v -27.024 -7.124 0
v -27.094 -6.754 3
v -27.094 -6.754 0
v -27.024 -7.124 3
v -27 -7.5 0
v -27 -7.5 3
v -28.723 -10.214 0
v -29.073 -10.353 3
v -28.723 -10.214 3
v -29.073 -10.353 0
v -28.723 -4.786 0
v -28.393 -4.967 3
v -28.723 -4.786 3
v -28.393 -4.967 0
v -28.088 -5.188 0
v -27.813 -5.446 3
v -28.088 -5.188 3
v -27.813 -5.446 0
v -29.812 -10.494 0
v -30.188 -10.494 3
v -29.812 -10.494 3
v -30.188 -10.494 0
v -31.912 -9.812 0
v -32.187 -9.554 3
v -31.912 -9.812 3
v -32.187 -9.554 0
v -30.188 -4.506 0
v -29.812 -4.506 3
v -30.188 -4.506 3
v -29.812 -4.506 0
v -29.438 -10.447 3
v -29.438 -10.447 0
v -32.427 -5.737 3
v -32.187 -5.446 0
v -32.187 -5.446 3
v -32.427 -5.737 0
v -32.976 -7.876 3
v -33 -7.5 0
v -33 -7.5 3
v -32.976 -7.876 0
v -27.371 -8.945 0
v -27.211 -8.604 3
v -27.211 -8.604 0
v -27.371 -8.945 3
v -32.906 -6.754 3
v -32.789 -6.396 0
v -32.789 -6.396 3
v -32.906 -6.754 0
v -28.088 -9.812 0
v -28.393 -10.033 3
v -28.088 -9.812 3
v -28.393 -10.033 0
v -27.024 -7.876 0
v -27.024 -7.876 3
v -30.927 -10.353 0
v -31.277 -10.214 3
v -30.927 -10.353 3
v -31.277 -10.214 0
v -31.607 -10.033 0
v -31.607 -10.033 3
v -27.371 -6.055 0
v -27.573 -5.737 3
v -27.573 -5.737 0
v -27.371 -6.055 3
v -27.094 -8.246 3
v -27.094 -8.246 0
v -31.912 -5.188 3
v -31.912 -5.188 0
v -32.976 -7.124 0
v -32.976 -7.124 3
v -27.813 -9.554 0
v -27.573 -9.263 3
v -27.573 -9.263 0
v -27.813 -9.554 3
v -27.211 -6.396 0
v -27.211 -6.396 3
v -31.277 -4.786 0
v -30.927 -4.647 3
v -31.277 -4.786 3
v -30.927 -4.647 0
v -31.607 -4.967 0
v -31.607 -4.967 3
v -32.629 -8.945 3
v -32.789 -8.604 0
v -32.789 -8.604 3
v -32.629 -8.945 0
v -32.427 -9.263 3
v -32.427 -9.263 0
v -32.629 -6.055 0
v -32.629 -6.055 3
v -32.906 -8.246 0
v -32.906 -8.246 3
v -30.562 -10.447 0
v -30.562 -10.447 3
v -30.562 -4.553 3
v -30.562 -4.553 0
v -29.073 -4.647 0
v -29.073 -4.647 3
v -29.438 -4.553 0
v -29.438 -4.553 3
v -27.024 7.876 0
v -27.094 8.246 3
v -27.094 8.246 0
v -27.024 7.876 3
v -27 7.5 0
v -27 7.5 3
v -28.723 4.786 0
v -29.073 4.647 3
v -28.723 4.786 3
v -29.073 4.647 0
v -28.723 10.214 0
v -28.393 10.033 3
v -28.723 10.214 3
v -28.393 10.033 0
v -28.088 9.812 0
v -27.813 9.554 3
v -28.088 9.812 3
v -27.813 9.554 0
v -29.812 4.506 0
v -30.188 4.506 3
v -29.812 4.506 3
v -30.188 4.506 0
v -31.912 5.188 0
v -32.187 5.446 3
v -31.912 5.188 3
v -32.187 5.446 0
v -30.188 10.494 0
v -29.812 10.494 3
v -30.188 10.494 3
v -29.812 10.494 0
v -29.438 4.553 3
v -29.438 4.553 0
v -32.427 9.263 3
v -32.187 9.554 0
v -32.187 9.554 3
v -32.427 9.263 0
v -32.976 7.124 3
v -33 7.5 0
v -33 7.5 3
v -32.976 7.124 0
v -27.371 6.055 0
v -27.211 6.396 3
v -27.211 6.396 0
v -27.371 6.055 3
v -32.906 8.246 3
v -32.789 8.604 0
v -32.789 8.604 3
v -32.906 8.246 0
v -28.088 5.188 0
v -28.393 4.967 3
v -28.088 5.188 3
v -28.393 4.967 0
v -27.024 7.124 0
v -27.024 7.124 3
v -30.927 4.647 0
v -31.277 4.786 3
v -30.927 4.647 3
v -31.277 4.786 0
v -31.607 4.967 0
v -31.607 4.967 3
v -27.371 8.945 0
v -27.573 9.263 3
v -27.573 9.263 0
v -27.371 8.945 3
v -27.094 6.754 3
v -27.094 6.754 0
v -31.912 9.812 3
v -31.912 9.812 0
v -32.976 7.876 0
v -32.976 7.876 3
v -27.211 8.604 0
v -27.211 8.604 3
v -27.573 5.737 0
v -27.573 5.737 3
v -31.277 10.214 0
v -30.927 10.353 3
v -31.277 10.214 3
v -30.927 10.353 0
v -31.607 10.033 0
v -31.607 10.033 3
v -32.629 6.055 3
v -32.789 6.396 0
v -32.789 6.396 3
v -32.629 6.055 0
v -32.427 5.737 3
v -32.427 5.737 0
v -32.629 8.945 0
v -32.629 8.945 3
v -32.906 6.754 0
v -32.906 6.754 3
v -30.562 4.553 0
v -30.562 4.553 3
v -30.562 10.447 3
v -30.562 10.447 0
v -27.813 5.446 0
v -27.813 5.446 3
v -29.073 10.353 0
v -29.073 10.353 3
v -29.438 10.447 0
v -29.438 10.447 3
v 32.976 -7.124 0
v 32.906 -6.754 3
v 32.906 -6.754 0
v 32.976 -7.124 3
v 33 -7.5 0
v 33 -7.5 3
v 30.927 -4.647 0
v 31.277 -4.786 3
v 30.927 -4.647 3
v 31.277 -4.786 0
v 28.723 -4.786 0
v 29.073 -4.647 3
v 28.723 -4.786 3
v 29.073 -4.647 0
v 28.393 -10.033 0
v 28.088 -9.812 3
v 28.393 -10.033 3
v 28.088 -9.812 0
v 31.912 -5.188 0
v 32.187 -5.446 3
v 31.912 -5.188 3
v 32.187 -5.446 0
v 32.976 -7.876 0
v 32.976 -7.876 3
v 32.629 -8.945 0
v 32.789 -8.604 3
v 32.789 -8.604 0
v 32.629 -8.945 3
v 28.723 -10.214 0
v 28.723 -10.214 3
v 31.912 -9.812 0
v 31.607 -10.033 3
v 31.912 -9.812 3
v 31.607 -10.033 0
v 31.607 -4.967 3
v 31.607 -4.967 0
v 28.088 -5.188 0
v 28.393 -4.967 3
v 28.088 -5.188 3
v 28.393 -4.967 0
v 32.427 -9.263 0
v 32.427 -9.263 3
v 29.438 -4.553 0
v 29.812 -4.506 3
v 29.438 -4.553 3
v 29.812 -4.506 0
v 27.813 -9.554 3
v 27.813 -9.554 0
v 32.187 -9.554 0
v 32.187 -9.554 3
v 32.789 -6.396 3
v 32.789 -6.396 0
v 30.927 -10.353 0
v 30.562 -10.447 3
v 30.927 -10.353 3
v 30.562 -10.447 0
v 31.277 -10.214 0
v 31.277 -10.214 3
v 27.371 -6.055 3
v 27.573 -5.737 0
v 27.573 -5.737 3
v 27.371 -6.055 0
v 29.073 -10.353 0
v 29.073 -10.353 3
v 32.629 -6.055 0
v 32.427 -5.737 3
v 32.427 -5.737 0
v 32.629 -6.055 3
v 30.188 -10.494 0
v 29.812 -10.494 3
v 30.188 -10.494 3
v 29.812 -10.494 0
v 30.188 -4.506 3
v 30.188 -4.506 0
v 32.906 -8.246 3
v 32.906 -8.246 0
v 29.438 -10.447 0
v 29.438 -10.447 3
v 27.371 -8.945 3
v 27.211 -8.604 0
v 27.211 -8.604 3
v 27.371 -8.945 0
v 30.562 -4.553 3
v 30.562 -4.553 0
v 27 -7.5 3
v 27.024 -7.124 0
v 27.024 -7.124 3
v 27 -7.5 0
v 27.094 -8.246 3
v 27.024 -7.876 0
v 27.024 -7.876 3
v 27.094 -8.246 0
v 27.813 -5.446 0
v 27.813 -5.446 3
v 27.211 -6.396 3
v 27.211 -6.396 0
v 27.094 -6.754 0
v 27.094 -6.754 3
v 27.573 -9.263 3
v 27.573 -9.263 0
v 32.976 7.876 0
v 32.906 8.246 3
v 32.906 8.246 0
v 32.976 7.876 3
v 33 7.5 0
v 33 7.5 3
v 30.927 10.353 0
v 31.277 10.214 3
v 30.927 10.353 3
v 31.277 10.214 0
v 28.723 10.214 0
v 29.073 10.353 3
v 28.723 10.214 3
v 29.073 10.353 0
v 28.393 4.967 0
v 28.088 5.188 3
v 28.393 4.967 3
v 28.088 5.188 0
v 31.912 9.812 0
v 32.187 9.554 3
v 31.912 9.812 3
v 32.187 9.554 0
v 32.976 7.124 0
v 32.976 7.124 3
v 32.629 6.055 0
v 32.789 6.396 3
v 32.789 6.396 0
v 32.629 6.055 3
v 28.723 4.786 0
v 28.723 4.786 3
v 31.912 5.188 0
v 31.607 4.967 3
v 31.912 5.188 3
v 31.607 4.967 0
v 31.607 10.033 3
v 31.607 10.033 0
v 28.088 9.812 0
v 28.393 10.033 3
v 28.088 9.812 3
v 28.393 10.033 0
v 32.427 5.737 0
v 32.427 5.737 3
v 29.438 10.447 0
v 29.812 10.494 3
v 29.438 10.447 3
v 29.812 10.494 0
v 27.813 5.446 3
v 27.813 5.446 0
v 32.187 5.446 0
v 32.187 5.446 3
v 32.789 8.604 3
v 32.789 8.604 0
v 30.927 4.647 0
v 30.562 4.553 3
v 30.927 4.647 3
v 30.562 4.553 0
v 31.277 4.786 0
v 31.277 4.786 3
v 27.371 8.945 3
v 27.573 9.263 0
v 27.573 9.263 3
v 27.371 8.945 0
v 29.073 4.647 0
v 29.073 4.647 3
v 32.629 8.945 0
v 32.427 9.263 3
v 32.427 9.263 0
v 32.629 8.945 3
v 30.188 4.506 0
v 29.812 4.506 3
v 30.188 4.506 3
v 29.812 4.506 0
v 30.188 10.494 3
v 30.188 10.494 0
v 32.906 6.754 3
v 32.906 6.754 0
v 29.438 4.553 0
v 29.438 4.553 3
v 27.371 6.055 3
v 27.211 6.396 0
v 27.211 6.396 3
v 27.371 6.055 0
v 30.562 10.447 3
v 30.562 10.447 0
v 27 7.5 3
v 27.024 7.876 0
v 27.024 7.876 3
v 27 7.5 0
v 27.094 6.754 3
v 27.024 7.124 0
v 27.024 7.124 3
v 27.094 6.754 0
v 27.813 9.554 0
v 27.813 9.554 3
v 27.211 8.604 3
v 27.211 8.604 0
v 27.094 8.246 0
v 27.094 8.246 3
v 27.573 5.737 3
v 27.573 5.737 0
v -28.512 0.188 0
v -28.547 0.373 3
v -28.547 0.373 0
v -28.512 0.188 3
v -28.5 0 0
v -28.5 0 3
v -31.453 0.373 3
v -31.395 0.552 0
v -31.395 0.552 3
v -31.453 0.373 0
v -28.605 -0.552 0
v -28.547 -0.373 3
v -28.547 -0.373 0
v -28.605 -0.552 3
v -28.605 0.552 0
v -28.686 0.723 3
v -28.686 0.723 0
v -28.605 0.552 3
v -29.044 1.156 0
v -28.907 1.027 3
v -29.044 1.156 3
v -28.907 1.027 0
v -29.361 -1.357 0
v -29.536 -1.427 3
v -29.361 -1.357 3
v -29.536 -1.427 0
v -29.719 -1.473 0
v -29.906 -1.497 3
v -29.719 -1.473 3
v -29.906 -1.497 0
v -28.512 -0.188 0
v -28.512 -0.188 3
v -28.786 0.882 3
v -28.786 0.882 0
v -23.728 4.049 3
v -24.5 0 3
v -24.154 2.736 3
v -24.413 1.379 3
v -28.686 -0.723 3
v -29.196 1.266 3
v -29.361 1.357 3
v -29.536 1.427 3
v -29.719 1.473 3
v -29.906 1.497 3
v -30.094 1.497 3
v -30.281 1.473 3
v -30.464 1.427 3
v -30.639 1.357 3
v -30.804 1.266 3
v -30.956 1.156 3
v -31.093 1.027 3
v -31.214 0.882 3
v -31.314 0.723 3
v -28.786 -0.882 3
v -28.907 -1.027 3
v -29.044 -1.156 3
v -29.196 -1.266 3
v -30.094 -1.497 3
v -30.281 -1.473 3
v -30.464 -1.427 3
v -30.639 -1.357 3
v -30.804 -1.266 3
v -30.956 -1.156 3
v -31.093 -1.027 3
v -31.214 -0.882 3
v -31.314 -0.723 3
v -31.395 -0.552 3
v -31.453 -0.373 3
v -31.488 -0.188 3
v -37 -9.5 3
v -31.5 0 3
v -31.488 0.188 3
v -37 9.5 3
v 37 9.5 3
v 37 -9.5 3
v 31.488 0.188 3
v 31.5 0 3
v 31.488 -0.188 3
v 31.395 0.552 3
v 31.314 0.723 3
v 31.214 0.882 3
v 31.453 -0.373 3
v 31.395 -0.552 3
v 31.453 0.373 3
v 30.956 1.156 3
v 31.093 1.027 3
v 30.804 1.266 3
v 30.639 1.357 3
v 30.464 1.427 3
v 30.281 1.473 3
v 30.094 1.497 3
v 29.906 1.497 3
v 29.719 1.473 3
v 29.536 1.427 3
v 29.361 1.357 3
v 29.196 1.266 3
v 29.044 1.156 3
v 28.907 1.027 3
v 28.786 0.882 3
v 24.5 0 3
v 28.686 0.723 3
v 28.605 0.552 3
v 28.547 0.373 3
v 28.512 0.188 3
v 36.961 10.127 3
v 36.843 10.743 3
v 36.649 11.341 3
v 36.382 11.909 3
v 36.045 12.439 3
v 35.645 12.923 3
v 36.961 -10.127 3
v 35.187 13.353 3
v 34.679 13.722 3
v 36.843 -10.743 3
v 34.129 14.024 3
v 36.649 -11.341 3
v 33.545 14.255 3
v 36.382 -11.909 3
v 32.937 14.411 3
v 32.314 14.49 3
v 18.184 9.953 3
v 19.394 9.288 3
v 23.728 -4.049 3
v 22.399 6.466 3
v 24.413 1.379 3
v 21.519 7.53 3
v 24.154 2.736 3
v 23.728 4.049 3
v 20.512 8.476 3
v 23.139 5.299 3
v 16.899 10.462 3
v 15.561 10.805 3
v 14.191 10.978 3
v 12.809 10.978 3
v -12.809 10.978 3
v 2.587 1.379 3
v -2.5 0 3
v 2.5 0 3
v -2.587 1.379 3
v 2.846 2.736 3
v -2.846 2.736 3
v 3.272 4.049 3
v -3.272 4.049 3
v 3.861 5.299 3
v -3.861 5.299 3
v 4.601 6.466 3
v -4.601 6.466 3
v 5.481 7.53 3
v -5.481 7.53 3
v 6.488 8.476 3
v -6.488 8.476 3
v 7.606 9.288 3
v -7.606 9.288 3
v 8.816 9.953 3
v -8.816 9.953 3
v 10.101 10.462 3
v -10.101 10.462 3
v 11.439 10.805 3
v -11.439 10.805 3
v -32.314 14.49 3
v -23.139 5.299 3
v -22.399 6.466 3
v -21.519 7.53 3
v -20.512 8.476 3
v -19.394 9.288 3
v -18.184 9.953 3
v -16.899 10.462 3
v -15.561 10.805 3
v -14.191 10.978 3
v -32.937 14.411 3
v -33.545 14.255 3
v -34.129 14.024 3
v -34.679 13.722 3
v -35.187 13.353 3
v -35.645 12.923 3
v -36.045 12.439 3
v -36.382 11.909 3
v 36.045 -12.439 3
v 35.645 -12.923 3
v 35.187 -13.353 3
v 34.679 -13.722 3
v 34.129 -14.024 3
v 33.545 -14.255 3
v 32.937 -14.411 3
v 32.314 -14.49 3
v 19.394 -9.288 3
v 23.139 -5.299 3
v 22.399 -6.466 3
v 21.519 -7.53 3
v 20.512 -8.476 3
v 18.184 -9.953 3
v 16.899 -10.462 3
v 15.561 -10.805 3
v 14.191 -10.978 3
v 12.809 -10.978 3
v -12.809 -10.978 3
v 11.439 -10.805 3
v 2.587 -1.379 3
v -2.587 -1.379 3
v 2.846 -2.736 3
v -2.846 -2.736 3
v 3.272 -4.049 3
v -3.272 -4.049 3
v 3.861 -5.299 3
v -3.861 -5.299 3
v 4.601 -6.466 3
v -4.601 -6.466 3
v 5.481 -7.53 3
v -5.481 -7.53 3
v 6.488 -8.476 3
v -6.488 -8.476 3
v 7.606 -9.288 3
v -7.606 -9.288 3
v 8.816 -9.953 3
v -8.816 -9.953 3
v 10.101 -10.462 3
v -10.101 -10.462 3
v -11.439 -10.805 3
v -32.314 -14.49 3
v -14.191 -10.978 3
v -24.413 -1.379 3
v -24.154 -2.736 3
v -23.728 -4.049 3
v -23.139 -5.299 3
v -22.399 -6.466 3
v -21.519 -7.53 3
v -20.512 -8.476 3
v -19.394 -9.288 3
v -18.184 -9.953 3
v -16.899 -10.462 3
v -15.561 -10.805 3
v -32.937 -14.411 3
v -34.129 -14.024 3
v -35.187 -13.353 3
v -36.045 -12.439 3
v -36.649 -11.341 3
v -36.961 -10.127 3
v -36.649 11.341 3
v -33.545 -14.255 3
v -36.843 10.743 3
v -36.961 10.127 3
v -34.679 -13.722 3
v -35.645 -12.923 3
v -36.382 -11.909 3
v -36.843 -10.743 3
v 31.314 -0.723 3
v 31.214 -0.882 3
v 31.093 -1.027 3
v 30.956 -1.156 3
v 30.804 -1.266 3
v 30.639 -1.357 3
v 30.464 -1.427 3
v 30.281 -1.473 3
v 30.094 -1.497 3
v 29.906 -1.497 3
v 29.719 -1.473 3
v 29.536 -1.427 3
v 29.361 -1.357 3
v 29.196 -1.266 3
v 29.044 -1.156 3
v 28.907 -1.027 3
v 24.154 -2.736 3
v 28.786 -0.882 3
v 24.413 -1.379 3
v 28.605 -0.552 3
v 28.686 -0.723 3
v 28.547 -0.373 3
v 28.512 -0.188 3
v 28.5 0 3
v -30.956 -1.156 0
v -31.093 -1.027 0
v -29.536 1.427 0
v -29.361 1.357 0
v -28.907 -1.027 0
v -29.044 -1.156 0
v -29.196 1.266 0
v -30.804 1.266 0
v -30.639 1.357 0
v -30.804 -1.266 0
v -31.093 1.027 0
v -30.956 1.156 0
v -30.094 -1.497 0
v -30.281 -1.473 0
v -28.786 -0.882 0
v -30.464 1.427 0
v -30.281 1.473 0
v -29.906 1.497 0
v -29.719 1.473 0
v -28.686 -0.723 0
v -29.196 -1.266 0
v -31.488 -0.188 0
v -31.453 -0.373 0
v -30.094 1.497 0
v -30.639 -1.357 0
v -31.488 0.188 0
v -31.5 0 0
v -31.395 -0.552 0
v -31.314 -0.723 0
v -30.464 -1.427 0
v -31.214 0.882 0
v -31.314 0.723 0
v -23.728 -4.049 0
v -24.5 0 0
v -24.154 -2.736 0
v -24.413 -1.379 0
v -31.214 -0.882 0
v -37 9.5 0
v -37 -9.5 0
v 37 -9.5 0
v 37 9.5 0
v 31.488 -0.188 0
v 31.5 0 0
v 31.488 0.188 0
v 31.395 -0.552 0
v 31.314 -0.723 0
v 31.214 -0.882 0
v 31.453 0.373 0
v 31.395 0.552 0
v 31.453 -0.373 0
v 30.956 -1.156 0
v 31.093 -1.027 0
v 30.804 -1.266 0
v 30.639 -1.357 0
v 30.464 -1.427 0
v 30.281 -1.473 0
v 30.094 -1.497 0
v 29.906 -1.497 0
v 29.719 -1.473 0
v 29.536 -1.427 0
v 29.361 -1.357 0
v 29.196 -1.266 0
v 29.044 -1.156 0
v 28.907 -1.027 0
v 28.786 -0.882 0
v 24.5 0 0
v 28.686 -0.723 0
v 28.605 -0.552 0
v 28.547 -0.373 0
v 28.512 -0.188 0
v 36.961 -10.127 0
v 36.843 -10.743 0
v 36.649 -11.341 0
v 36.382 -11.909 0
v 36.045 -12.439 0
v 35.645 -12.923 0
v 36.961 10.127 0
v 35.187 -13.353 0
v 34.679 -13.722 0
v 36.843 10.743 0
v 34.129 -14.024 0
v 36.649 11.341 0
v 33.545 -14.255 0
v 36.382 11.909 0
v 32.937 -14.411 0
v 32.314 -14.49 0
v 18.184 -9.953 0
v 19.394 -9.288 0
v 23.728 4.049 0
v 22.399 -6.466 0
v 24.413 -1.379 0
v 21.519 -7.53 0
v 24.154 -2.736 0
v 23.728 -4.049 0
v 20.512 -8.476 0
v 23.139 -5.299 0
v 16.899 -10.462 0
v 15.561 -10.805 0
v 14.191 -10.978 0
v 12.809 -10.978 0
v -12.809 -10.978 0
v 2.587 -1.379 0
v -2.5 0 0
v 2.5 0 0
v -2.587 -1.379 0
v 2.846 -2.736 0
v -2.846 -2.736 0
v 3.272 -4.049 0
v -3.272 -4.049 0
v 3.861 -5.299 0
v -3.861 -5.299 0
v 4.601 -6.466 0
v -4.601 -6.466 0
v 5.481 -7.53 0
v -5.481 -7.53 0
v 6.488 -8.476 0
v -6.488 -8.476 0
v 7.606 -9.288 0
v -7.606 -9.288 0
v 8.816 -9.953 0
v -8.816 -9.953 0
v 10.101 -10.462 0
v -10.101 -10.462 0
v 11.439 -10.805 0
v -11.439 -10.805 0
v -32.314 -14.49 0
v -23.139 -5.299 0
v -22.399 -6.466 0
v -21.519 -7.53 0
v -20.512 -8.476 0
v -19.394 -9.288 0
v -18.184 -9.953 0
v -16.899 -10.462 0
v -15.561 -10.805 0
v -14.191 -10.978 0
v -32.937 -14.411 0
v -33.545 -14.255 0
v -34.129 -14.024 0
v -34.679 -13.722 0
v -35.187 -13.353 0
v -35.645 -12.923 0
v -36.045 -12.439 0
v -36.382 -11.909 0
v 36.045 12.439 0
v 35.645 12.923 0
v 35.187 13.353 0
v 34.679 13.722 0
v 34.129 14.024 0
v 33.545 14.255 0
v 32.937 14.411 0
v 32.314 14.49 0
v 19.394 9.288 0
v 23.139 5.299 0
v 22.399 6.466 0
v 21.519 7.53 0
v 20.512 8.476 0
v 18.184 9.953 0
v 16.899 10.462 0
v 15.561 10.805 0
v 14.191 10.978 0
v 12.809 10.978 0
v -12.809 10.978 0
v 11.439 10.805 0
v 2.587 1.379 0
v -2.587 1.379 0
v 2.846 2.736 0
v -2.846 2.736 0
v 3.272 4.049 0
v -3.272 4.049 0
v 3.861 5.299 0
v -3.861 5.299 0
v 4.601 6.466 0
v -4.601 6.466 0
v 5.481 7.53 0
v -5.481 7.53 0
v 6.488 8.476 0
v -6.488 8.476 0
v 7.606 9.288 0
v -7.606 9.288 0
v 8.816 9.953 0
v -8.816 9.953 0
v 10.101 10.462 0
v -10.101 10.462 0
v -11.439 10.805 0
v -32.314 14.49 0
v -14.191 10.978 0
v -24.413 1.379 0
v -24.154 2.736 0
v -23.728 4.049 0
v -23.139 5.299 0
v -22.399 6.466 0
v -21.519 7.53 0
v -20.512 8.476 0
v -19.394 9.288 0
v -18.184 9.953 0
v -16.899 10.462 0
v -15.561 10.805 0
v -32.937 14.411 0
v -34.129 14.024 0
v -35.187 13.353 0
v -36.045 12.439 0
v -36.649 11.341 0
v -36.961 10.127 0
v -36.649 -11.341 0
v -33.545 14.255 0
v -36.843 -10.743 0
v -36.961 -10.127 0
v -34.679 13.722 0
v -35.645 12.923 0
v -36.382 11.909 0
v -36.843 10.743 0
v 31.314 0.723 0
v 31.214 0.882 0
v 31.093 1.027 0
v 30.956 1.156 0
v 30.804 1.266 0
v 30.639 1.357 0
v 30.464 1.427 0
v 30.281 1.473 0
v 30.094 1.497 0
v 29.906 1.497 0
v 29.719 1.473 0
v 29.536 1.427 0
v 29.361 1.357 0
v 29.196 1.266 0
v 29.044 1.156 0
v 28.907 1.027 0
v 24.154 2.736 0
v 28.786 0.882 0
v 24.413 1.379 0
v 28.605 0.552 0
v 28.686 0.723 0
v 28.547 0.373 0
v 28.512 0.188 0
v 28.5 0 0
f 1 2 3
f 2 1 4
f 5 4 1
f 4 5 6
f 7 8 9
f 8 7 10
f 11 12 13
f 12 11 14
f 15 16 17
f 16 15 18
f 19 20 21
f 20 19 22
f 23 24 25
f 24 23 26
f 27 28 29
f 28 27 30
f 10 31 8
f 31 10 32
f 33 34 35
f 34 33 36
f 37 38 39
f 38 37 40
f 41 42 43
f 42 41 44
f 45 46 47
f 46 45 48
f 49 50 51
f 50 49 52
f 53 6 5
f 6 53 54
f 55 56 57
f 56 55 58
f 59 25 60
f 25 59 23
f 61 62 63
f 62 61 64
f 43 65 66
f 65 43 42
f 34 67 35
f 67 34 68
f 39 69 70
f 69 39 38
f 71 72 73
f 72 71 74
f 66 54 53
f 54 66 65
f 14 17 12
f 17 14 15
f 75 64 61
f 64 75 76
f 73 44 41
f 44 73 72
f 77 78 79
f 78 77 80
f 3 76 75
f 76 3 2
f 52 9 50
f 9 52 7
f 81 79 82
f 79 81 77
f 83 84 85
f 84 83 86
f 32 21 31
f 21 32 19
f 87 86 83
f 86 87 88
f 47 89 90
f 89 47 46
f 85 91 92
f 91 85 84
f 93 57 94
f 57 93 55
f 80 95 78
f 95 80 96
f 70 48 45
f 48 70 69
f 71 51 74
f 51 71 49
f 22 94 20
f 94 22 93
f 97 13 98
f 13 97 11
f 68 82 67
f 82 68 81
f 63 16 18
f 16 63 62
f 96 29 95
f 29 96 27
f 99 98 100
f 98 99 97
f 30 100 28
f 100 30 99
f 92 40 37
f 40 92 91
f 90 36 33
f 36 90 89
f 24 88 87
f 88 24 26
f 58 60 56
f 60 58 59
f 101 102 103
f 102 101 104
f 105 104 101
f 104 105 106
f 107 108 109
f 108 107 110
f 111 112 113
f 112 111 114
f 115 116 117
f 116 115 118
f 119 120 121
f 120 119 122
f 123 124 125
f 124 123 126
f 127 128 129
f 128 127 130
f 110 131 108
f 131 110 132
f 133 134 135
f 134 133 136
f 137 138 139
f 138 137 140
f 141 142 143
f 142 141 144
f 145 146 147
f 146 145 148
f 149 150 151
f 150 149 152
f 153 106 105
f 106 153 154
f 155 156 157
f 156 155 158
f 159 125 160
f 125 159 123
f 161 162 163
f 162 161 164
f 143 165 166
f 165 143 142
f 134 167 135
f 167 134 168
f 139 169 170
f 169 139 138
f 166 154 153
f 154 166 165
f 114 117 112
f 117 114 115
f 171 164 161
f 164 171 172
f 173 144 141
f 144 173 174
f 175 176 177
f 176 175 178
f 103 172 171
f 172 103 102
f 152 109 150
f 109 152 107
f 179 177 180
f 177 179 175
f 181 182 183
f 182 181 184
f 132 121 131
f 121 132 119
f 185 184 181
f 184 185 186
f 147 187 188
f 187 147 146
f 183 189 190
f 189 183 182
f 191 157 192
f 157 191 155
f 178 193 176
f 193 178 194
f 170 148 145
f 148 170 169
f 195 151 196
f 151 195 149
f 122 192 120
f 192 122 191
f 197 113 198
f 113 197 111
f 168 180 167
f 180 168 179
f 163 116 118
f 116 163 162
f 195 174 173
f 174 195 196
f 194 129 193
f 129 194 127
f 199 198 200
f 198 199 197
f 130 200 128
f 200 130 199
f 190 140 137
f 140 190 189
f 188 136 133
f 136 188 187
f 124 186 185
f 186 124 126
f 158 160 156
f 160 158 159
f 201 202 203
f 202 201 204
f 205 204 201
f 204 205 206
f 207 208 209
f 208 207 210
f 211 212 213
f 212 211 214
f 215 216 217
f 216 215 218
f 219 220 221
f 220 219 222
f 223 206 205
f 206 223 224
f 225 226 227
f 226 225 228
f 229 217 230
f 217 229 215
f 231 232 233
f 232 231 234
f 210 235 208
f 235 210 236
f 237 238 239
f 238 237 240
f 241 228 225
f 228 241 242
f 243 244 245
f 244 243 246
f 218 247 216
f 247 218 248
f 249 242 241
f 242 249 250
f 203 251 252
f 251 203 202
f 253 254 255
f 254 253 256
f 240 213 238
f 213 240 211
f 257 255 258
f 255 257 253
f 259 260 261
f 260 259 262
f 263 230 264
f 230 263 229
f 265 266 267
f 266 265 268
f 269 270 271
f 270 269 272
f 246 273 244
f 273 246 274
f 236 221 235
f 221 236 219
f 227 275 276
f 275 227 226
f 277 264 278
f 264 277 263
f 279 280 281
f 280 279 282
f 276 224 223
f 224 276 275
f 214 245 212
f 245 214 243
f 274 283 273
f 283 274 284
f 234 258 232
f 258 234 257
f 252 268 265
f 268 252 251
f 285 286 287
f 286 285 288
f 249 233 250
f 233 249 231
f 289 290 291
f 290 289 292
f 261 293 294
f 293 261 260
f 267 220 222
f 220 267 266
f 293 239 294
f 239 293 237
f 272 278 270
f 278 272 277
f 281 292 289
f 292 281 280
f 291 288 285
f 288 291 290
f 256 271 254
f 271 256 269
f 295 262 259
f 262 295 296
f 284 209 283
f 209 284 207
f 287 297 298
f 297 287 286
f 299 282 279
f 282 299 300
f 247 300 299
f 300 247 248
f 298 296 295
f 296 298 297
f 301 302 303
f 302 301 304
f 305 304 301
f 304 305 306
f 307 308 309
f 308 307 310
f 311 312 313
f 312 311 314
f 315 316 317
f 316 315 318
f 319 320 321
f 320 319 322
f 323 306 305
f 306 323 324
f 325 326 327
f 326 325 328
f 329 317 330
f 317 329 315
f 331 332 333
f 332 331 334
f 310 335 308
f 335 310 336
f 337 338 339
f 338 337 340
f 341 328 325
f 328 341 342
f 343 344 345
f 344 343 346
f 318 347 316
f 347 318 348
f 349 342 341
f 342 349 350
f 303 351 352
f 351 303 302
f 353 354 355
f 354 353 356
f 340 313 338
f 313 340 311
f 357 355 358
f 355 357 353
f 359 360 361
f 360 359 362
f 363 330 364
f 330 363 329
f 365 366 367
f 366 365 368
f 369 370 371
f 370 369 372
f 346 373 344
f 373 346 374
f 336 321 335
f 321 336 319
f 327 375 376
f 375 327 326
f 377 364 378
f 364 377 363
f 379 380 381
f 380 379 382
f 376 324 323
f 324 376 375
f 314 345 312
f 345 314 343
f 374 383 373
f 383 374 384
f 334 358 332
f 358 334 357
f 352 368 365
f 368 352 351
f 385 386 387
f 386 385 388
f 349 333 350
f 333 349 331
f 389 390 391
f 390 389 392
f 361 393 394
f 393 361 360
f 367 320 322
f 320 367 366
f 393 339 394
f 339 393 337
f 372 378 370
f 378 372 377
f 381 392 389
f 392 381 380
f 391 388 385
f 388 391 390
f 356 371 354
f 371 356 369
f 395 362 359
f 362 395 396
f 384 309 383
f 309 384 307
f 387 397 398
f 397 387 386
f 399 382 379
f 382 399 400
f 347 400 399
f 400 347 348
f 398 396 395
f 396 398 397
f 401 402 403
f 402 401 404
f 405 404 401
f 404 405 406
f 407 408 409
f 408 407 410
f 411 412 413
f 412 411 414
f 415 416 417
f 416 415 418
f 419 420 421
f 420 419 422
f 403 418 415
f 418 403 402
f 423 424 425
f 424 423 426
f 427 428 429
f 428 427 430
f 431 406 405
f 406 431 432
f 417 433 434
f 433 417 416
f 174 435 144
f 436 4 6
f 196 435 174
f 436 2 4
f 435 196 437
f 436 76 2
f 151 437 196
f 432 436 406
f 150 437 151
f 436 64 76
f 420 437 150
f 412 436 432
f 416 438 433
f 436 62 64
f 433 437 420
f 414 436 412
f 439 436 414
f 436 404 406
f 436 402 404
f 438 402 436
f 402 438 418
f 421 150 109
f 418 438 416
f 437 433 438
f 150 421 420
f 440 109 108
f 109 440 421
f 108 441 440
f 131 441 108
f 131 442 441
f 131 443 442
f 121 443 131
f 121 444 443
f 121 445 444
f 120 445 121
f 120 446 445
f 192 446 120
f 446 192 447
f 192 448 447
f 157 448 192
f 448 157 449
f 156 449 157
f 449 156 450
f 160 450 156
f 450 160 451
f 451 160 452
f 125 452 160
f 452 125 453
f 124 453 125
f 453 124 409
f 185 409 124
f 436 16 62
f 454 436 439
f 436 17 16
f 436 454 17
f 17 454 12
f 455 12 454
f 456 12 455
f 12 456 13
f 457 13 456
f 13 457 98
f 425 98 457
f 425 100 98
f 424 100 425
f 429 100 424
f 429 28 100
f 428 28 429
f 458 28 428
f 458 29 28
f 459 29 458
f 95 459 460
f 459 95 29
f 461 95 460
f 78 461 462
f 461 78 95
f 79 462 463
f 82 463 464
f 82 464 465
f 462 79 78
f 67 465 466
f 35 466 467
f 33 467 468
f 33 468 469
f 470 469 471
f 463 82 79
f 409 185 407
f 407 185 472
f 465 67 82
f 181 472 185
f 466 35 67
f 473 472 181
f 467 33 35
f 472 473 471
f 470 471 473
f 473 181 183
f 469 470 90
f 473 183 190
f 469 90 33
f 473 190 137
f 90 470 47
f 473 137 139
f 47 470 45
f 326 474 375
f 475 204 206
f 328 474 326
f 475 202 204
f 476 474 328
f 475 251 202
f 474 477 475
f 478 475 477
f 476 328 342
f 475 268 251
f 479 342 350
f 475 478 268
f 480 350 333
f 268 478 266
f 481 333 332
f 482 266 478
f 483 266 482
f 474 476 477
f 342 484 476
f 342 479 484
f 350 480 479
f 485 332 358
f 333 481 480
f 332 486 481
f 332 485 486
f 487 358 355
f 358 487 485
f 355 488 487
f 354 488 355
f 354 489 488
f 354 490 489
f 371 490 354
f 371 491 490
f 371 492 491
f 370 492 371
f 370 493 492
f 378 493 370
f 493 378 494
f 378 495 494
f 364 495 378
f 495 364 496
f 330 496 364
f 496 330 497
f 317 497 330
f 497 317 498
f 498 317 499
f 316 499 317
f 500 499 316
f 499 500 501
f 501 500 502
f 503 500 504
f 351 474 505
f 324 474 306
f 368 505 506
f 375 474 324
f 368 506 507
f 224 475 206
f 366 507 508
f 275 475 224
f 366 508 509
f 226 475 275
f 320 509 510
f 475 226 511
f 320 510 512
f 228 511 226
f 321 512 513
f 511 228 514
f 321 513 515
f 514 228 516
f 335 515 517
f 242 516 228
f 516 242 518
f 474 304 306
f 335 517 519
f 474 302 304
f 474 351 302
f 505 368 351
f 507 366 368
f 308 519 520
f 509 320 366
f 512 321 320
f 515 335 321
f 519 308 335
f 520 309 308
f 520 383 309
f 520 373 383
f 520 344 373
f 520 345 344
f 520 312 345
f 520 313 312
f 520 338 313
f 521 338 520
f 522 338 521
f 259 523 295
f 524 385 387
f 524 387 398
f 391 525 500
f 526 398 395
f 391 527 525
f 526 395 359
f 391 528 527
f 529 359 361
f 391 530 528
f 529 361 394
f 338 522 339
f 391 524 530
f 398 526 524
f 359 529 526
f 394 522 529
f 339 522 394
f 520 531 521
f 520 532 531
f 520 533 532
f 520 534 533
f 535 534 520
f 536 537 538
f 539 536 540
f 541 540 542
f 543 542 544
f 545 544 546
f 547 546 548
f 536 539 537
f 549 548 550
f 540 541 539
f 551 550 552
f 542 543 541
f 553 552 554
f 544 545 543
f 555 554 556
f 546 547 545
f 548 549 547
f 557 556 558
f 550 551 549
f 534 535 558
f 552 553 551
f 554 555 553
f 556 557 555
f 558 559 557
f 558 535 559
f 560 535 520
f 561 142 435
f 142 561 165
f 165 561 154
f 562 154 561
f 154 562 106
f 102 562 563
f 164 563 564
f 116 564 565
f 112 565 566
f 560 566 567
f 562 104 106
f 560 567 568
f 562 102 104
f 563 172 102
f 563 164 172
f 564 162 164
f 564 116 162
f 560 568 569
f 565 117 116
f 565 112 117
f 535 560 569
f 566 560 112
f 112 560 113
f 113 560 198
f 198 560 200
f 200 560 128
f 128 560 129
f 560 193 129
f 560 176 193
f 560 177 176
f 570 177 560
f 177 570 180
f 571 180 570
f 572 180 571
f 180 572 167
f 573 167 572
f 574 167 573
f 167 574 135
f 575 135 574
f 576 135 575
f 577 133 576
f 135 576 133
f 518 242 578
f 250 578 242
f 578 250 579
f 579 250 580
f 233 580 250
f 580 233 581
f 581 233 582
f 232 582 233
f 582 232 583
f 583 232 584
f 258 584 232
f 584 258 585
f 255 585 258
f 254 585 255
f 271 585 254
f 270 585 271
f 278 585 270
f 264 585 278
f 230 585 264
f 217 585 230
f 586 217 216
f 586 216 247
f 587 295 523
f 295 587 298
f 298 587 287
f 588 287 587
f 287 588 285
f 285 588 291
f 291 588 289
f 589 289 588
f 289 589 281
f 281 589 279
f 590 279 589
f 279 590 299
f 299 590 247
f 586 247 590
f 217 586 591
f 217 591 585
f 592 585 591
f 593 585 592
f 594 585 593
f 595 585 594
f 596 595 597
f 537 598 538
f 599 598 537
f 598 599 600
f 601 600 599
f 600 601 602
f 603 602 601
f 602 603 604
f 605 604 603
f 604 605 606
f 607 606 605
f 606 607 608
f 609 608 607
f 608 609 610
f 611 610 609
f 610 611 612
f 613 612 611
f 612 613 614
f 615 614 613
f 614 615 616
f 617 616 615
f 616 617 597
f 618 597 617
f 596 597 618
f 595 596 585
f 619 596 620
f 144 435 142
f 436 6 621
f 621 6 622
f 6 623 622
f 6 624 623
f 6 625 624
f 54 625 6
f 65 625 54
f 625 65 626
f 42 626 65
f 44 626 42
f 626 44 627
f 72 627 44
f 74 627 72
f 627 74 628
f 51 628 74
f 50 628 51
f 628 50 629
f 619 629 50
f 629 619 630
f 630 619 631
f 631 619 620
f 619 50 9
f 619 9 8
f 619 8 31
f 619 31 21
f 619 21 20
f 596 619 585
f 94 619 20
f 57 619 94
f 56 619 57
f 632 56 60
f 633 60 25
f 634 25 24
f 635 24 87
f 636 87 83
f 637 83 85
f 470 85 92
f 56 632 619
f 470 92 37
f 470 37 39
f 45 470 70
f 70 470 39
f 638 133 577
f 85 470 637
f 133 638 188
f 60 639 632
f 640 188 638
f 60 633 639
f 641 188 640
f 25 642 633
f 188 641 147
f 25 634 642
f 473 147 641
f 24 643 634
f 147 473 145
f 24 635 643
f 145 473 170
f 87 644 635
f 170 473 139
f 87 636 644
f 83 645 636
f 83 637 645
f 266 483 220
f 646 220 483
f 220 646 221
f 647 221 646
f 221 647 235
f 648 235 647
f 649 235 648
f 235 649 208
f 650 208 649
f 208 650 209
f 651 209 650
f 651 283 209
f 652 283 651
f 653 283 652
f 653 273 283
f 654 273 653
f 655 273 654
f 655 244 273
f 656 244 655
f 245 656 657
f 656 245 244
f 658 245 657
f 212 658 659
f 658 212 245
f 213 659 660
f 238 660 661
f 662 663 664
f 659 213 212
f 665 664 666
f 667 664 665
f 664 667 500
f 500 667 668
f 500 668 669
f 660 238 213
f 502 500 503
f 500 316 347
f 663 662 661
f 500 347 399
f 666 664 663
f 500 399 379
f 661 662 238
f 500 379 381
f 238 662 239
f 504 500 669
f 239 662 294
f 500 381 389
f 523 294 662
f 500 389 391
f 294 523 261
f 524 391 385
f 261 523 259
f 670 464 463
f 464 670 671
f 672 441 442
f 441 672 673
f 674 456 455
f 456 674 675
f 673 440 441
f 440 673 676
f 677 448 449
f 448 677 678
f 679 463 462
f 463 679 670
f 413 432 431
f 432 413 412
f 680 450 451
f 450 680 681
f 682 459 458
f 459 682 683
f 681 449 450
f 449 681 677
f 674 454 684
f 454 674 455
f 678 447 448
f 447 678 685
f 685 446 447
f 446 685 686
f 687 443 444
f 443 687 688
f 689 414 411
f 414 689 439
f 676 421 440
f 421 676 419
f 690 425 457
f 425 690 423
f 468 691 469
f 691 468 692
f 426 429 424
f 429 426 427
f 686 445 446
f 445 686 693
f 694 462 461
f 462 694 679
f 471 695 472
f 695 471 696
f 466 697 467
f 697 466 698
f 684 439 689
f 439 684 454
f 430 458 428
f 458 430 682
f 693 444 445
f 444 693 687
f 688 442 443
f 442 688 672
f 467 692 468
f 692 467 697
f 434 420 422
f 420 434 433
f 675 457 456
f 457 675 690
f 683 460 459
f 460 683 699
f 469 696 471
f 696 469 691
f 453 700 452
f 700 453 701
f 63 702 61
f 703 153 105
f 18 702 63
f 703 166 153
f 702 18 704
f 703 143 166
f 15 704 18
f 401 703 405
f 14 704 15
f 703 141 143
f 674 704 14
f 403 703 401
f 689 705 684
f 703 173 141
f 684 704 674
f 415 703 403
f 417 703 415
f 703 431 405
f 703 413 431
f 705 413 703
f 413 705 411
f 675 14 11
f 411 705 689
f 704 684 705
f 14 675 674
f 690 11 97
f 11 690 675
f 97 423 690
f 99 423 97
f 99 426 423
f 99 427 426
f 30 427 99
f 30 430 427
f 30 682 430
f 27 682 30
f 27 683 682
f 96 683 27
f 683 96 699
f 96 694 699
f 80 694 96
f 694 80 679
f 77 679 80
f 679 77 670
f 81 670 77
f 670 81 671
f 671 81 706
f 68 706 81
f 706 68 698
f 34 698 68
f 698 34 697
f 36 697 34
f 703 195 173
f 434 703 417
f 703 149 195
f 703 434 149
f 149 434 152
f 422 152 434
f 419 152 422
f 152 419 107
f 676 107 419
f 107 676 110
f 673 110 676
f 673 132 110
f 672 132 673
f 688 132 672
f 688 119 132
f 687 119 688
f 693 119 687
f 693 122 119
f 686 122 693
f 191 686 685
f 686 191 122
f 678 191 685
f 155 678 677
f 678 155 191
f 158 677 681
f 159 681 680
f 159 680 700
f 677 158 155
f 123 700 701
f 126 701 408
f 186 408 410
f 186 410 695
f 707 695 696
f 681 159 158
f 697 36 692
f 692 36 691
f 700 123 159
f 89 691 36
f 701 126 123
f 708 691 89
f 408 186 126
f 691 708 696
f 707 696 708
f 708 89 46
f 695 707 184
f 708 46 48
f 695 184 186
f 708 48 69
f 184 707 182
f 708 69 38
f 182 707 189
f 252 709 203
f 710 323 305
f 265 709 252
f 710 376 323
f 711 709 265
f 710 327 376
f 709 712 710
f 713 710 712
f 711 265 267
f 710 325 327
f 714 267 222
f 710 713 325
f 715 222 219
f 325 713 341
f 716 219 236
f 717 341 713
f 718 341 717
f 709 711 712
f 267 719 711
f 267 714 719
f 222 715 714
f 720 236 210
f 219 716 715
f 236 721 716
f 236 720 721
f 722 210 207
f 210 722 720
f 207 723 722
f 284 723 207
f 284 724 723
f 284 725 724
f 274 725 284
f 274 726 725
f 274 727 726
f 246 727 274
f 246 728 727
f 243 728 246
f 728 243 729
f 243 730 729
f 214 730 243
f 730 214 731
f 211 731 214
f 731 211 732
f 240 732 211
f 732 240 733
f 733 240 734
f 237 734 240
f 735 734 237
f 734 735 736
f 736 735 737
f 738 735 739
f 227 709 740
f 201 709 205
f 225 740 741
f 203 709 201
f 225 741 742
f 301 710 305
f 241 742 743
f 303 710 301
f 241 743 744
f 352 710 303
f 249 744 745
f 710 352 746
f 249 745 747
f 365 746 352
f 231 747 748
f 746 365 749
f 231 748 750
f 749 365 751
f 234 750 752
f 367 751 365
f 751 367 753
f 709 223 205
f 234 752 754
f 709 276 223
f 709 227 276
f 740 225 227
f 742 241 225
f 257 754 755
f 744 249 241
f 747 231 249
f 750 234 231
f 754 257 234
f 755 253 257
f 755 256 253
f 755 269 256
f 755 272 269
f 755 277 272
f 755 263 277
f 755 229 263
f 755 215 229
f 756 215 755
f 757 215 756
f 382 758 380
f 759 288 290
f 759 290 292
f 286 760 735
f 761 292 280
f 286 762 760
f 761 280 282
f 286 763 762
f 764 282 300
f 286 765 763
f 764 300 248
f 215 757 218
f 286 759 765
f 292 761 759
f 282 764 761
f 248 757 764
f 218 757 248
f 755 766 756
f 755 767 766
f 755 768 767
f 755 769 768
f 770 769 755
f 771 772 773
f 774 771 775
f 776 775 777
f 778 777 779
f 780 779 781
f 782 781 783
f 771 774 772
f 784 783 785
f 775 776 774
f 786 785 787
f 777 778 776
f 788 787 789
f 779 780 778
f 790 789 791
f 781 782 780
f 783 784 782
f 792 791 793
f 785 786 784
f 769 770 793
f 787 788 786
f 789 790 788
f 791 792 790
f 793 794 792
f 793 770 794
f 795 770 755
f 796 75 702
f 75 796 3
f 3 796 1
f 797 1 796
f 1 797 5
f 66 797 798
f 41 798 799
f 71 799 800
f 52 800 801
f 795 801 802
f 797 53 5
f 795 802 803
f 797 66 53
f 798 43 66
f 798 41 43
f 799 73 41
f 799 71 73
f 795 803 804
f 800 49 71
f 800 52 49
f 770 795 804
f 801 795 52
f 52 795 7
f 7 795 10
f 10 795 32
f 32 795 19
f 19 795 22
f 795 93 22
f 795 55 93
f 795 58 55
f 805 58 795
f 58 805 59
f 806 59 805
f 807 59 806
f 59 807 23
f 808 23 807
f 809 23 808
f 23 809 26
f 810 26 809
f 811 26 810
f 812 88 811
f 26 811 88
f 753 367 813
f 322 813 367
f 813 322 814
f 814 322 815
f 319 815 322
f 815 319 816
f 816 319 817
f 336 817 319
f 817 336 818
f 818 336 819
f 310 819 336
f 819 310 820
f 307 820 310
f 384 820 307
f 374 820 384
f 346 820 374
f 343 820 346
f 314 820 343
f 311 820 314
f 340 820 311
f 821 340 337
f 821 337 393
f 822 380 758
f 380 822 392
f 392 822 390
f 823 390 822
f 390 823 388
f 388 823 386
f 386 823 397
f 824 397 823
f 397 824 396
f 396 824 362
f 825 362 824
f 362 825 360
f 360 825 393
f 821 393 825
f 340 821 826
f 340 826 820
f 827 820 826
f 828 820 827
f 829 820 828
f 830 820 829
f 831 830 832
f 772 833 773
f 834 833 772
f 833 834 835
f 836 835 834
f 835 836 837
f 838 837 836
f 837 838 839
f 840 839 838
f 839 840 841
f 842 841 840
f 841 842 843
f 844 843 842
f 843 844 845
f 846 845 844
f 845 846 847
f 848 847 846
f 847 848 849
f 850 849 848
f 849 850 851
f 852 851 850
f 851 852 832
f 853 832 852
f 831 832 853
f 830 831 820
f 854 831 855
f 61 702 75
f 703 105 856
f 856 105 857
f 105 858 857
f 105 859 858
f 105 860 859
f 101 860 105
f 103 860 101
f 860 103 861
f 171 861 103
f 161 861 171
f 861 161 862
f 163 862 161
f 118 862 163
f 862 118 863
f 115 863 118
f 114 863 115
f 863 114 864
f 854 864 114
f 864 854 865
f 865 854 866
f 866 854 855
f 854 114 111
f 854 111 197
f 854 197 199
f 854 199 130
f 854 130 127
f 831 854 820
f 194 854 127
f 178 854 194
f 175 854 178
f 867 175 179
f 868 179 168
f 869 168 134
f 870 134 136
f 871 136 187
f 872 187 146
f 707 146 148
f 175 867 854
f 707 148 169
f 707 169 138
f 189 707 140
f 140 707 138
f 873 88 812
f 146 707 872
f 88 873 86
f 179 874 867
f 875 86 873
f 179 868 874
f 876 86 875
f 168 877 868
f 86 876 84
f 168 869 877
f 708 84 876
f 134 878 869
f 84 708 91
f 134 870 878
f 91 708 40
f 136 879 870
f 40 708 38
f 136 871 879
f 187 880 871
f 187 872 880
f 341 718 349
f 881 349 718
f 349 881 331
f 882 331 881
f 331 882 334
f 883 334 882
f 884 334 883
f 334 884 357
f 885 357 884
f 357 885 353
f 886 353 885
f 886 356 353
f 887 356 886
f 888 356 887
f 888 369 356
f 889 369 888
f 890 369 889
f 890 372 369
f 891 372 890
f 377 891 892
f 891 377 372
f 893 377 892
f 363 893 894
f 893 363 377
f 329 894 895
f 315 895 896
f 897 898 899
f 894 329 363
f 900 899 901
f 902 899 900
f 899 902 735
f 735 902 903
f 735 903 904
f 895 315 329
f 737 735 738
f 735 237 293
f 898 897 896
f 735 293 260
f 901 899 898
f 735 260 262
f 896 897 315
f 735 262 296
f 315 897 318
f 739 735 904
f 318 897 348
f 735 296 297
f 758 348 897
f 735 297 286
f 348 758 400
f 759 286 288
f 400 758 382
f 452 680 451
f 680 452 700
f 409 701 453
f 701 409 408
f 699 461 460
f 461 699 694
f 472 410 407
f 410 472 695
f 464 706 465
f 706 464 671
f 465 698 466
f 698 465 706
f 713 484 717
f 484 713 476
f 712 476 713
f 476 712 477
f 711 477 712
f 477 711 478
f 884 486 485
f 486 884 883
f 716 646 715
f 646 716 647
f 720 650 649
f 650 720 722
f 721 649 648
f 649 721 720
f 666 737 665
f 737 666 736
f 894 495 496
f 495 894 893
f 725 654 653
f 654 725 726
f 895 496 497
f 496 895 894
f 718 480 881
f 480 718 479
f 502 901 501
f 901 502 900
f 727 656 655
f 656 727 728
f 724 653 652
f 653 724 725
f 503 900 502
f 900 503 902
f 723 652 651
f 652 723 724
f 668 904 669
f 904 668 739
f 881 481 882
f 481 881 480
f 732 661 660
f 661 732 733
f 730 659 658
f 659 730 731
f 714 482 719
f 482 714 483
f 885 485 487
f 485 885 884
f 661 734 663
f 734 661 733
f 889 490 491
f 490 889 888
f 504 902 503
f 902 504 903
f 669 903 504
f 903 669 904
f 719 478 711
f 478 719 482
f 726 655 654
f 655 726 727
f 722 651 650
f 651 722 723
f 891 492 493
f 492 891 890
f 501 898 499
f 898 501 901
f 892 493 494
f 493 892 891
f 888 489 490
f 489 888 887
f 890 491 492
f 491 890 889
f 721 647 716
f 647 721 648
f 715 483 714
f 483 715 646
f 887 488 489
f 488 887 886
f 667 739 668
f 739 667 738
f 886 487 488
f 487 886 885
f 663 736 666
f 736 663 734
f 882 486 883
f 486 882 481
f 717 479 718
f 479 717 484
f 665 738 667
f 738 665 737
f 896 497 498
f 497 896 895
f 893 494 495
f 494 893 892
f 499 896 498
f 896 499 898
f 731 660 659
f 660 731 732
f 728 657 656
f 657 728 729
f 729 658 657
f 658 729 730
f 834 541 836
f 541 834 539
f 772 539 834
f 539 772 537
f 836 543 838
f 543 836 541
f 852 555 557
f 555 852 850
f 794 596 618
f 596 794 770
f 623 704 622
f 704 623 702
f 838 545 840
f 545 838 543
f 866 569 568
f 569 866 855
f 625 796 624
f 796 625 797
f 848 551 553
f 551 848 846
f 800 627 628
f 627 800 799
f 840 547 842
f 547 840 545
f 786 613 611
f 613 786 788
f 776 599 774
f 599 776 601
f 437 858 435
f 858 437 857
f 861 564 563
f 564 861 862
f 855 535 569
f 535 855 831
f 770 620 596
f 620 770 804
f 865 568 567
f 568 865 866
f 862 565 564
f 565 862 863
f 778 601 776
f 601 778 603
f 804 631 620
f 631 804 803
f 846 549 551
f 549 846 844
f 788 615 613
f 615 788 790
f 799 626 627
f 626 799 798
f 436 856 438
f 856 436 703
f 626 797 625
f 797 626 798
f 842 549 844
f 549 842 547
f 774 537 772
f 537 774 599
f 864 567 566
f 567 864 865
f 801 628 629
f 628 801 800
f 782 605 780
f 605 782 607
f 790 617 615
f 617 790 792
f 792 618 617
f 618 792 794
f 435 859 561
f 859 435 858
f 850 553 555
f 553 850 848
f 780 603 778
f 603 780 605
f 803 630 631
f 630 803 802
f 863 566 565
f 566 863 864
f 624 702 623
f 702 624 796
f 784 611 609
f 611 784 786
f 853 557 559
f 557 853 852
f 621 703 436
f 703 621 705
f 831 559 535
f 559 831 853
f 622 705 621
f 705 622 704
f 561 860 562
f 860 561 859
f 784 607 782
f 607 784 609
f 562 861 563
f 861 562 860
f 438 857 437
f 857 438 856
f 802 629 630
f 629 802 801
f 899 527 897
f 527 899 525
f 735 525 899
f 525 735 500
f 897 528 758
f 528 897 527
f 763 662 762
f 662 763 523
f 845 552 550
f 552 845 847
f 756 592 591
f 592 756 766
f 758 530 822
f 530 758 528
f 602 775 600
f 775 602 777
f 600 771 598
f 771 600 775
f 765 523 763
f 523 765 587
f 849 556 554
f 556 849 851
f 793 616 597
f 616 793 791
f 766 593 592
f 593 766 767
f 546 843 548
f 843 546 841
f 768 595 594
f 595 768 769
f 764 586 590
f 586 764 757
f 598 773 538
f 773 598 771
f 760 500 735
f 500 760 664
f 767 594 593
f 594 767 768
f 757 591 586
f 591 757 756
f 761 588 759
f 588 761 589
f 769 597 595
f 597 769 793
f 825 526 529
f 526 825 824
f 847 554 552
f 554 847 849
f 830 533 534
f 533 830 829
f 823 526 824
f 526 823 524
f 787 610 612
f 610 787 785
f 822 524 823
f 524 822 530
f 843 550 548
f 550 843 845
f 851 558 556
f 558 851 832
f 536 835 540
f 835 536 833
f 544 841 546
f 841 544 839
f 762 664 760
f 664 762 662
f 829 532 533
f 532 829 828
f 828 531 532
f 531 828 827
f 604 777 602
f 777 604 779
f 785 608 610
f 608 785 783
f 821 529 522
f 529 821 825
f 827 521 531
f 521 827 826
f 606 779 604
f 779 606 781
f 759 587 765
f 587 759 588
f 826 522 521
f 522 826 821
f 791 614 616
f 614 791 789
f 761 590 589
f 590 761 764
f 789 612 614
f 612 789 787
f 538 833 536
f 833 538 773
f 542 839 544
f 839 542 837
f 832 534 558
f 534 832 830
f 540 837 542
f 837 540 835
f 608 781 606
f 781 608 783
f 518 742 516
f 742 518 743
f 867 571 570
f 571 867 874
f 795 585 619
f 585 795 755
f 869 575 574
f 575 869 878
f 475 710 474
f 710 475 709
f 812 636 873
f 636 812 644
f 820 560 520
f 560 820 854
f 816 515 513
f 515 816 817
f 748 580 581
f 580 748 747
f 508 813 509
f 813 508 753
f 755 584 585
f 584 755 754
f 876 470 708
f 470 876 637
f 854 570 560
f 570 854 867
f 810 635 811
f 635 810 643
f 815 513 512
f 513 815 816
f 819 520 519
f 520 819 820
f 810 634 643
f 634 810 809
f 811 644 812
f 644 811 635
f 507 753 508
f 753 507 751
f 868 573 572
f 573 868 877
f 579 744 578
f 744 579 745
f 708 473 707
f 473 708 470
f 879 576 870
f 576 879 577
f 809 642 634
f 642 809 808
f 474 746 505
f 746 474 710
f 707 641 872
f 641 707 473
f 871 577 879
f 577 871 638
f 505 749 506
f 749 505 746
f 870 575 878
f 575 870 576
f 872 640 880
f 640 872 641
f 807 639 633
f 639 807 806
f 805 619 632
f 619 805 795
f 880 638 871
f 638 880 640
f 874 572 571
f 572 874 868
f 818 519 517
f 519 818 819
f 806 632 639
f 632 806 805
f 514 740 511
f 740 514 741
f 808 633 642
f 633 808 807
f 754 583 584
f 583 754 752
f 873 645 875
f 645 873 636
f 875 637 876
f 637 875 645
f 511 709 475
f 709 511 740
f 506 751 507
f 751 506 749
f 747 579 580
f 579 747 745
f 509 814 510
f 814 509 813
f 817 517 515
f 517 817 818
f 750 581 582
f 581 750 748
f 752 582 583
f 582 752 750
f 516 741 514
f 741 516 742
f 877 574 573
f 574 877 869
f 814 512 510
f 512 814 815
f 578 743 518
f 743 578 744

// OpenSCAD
$fn = 50;


difference() {
	union() {
		hull() {
			translate(v = [-32.0000000000, 9.5000000000, 0]) {
				cylinder(h = 3, r = 5);
			}
			translate(v = [32.0000000000, 9.5000000000, 0]) {
				cylinder(h = 3, r = 5);
			}
			translate(v = [-32.0000000000, -9.5000000000, 0]) {
				cylinder(h = 3, r = 5);
			}
			translate(v = [32.0000000000, -9.5000000000, 0]) {
				cylinder(h = 3, r = 5);
			}
		}
	}
	union() {
		#translate(v = [-30.0000000000, -7.5000000000, 0]) {
			cylinder(h = 3, r = 3.0000000000);
		}
		#translate(v = [-30.0000000000, 7.5000000000, 0]) {
			cylinder(h = 3, r = 3.0000000000);
		}
		#translate(v = [30.0000000000, -7.5000000000, 0]) {
			cylinder(h = 3, r = 3.0000000000);
		}
		#translate(v = [30.0000000000, 7.5000000000, 0]) {
			cylinder(h = 3, r = 3.0000000000);
		}
		#translate(v = [-30.0000000000, -7.5000000000, -100.0000000000]) {
			cylinder(h = 200, r = 3.0000000000);
		}
		#translate(v = [-30.0000000000, 7.5000000000, -100.0000000000]) {
			cylinder(h = 200, r = 3.0000000000);
		}
		#translate(v = [30.0000000000, -7.5000000000, -100.0000000000]) {
			cylinder(h = 200, r = 3.0000000000);
		}
		#translate(v = [30.0000000000, 7.5000000000, -100.0000000000]) {
			cylinder(h = 200, r = 3.0000000000);
		}
		#translate(v = [-30.0000000000, -7.5000000000, 0]) {
			cylinder(h = 3, r = 1.5000000000);
		}
		#translate(v = [-30.0000000000, 0.0000000000, 0]) {
			cylinder(h = 3, r = 1.5000000000);
		}
		#translate(v = [-30.0000000000, 7.5000000000, 0]) {
			cylinder(h = 3, r = 1.5000000000);
		}
		#translate(v = [30.0000000000, -7.5000000000, 0]) {
			cylinder(h = 3, r = 1.5000000000);
		}
		#translate(v = [30.0000000000, 0.0000000000, 0]) {
			cylinder(h = 3, r = 1.5000000000);
		}
		#translate(v = [30.0000000000, 7.5000000000, 0]) {
			cylinder(h = 3, r = 1.5000000000);
		}
		#translate(v = [-30.0000000000, -7.5000000000, 0]) {
			cylinder(h = 3, r = 1.5000000000);
		}
		#translate(v = [-30.0000000000, 0.0000000000, 0]) {
			cylinder(h = 3, r = 1.5000000000);
		}
		#translate(v = [-30.0000000000, 7.5000000000, 0]) {
			cylinder(h = 3, r = 1.5000000000);
		}
		#translate(v = [30.0000000000, -7.5000000000, 0]) {
			cylinder(h = 3, r = 1.5000000000);
		}
		#translate(v = [30.0000000000, 0.0000000000, 0]) {
			cylinder(h = 3, r = 1.5000000000);
		}
		#translate(v = [30.0000000000, 7.5000000000, 0]) {
			cylinder(h = 3, r = 1.5000000000);
		}
		#translate(v = [-30.0000000000, -7.5000000000, 0]) {
			cylinder(h = 3, r = 1.5000000000);
		}
		#translate(v = [-30.0000000000, 0.0000000000, 0]) {
			cylinder(h = 3, r = 1.5000000000);
		}
		#translate(v = [-30.0000000000, 7.5000000000, 0]) {
			cylinder(h = 3, r = 1.5000000000);
		}
		#translate(v = [30.0000000000, -7.5000000000, 0]) {
			cylinder(h = 3, r = 1.5000000000);
		}
		#translate(v = [30.0000000000, 0.0000000000, 0]) {
			cylinder(h = 3, r = 1.5000000000);
		}
		#translate(v = [30.0000000000, 7.5000000000, 0]) {
			cylinder(h = 3, r = 1.5000000000);
		}
		#translate(v = [-13.5000000000, 0, 0]) {
			cylinder(h = 3, r = 11.0000000000);
		}
		#translate(v = [13.5000000000, 0, 0]) {
			cylinder(h = 3, r = 11.0000000000);
		}
	}
}
